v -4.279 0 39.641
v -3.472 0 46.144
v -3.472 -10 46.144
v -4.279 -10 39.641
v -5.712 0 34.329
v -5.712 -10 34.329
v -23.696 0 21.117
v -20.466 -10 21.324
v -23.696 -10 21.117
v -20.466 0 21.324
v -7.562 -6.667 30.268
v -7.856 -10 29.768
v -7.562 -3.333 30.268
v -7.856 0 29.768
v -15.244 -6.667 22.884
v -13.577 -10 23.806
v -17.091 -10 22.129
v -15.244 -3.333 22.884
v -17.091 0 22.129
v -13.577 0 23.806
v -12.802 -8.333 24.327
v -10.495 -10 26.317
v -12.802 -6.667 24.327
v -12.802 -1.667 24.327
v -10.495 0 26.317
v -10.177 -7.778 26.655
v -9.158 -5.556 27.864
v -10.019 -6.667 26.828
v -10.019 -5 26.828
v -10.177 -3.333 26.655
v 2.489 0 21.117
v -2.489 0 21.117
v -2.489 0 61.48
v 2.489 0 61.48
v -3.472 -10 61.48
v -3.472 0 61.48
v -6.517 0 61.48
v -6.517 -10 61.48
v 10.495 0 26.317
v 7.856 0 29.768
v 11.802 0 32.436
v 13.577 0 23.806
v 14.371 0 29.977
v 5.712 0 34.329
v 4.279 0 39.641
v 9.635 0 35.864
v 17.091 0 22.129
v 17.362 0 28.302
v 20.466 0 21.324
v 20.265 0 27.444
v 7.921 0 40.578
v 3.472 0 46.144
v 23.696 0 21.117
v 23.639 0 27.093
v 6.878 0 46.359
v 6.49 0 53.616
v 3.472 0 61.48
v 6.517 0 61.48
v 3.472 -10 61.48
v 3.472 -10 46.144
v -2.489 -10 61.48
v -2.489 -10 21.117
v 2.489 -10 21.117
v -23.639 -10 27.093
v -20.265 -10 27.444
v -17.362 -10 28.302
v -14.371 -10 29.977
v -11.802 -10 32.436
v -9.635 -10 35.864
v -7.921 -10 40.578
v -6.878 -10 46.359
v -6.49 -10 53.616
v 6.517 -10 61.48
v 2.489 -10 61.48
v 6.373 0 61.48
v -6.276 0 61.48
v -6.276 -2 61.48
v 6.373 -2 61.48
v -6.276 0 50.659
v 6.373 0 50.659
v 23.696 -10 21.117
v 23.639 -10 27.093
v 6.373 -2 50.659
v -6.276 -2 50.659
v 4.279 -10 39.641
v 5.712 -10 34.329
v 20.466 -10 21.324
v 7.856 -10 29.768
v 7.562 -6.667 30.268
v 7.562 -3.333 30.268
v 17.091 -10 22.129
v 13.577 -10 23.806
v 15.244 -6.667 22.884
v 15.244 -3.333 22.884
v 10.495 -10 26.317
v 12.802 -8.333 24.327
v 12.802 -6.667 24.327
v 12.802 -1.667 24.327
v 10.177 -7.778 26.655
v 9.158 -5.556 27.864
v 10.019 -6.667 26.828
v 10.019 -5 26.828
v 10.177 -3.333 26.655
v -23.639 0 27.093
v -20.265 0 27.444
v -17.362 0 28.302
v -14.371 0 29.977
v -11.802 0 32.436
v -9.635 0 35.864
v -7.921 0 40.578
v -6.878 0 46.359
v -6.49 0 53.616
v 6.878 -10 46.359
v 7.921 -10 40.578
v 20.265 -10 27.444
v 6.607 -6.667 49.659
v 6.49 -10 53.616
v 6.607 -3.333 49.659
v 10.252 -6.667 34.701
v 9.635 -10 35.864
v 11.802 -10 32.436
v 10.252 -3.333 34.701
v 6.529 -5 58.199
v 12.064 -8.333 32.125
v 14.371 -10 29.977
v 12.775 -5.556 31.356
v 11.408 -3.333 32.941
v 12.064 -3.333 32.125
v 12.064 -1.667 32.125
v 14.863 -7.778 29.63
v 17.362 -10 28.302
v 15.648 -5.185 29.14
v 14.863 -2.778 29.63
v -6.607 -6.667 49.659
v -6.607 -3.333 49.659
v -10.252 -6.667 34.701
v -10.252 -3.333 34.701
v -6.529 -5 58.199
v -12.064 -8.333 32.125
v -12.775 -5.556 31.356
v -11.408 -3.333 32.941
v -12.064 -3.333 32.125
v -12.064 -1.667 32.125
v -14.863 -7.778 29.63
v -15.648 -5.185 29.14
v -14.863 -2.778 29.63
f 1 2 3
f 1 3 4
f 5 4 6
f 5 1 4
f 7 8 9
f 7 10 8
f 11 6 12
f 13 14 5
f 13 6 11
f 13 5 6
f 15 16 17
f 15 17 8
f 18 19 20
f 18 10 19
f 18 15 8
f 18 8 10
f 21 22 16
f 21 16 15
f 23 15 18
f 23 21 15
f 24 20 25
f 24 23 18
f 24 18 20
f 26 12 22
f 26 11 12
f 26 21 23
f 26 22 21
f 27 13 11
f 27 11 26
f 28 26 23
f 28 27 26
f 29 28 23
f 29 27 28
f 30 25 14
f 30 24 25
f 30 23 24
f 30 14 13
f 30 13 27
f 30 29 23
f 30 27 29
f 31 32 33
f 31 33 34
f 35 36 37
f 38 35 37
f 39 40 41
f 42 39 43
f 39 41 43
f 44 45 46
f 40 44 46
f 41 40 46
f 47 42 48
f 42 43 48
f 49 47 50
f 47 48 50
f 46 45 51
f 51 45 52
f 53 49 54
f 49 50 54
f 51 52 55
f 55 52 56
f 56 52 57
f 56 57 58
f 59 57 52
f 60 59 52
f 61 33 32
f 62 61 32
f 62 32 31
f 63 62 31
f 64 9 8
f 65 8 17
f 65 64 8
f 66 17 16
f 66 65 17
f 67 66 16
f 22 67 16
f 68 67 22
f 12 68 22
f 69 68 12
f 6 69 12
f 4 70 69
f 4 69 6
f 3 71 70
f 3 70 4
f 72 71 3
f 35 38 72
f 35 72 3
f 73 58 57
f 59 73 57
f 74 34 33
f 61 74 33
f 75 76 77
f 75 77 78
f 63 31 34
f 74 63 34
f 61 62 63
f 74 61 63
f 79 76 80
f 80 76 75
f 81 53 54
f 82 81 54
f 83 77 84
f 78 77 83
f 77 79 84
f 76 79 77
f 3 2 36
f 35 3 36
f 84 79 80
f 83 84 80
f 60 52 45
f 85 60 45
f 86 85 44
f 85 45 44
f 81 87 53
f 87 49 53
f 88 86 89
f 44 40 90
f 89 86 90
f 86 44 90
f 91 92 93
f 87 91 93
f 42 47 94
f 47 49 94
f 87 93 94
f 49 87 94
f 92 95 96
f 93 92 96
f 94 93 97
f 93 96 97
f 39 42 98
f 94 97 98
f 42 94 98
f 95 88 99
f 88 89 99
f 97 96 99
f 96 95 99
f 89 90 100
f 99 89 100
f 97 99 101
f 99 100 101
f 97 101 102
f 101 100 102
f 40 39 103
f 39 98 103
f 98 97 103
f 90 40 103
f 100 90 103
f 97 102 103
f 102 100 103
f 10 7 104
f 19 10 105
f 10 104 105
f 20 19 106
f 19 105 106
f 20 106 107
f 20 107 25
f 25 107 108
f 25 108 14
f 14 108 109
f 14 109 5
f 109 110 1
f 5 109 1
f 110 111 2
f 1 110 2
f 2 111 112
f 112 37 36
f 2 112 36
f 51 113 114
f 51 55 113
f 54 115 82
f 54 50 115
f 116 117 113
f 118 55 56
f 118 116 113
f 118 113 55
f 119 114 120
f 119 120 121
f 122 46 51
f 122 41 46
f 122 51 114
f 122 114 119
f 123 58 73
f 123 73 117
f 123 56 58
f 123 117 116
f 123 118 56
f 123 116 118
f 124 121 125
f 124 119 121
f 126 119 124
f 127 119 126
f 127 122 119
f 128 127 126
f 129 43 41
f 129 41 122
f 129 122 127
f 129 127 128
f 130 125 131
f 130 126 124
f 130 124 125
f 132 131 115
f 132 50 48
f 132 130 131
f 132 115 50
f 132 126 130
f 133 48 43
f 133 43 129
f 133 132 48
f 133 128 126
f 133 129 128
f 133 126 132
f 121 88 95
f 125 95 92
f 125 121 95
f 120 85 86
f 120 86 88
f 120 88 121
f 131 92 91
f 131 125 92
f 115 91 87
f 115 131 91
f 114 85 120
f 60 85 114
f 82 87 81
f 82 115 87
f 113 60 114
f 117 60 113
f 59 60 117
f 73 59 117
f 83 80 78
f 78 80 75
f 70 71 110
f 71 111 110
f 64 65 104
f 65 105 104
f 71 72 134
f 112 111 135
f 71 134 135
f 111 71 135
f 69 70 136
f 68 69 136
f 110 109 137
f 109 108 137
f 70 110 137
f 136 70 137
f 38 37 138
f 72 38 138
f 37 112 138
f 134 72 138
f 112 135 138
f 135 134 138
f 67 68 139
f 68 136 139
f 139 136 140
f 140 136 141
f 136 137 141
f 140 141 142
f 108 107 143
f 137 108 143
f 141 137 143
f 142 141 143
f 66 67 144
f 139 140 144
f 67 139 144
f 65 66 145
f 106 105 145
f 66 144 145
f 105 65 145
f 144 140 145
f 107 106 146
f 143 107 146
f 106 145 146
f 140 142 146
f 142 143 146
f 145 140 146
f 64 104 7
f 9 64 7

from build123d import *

# Parameters (mm, degrees)
F2_DEPTH = 10
F3_W     = 12.649741
F3_H     = 10.821469
F4_DEPTH = 2


with BuildPart() as f2:
    # F1 (on Front) → F2 (new body)
    with BuildSketch(Plane.XZ):
        with BuildLine():
            Line((-3.471778, 61.480351), (-6.517444, 61.480351))
            add(Edge.make_bspline(
                [(-6.517444, 61.480351), (-6.890875, 54.721402), (-3.318327, 27.531832), (-23.638815, 27.092563)],
                knots=[0, 0, 0, 0, 38.414337, 38.414337, 38.414337, 38.414337], degree=3))
            Line((-23.638815, 27.092563), (-23.696268, 21.117225))
            add(Edge.make_bspline(
                [(-3.471778, 46.144499), (-4.824824, 25.064949), (-15.800724, 21.032378), (-23.696268, 21.117225)],
                knots=[0, 0, 0, 0, 32.177545, 32.177545, 32.177545, 32.177545], degree=3))
            Line((-3.471778, 46.144499), (-3.471778, 61.480351))
        make_face()
        Polygon((2.489035, 61.480351), (0, 61.480351), (-2.489035, 61.480351), (-2.489035, 21.117225), (0, 21.117225), (2.489035, 21.117225), align=None)
        with BuildLine():
            Line((6.517444, 61.480351), (3.471778, 61.480351))
            Line((3.471778, 61.480351), (3.471778, 46.144499))
            add(Edge.make_bspline(
                [(3.471778, 46.144499), (4.824824, 25.064949), (15.800724, 21.032378), (23.696268, 21.117225)],
                knots=[0, 0, 0, 0, 32.177545, 32.177545, 32.177545, 32.177545], degree=3))
            Line((23.696268, 21.117225), (23.638815, 27.092563))
            add(Edge.make_bspline(
                [(6.517444, 61.480351), (6.890875, 54.721402), (3.318327, 27.531832), (23.638815, 27.092563)],
                knots=[0, 0, 0, 0, 38.414337, 38.414337, 38.414337, 38.414337], degree=3))
        make_face()
    extrude(amount=F2_DEPTH)


with BuildPart() as f4:
    # F3 (on Front) → F4 (new body)
    with BuildSketch(Plane.XZ):
        with Locations((0.048461, 56.069616)):
            Rectangle(F3_W, F3_H)
    extrude(amount=F4_DEPTH)


solid = Compound([f2.part, f4.part])
